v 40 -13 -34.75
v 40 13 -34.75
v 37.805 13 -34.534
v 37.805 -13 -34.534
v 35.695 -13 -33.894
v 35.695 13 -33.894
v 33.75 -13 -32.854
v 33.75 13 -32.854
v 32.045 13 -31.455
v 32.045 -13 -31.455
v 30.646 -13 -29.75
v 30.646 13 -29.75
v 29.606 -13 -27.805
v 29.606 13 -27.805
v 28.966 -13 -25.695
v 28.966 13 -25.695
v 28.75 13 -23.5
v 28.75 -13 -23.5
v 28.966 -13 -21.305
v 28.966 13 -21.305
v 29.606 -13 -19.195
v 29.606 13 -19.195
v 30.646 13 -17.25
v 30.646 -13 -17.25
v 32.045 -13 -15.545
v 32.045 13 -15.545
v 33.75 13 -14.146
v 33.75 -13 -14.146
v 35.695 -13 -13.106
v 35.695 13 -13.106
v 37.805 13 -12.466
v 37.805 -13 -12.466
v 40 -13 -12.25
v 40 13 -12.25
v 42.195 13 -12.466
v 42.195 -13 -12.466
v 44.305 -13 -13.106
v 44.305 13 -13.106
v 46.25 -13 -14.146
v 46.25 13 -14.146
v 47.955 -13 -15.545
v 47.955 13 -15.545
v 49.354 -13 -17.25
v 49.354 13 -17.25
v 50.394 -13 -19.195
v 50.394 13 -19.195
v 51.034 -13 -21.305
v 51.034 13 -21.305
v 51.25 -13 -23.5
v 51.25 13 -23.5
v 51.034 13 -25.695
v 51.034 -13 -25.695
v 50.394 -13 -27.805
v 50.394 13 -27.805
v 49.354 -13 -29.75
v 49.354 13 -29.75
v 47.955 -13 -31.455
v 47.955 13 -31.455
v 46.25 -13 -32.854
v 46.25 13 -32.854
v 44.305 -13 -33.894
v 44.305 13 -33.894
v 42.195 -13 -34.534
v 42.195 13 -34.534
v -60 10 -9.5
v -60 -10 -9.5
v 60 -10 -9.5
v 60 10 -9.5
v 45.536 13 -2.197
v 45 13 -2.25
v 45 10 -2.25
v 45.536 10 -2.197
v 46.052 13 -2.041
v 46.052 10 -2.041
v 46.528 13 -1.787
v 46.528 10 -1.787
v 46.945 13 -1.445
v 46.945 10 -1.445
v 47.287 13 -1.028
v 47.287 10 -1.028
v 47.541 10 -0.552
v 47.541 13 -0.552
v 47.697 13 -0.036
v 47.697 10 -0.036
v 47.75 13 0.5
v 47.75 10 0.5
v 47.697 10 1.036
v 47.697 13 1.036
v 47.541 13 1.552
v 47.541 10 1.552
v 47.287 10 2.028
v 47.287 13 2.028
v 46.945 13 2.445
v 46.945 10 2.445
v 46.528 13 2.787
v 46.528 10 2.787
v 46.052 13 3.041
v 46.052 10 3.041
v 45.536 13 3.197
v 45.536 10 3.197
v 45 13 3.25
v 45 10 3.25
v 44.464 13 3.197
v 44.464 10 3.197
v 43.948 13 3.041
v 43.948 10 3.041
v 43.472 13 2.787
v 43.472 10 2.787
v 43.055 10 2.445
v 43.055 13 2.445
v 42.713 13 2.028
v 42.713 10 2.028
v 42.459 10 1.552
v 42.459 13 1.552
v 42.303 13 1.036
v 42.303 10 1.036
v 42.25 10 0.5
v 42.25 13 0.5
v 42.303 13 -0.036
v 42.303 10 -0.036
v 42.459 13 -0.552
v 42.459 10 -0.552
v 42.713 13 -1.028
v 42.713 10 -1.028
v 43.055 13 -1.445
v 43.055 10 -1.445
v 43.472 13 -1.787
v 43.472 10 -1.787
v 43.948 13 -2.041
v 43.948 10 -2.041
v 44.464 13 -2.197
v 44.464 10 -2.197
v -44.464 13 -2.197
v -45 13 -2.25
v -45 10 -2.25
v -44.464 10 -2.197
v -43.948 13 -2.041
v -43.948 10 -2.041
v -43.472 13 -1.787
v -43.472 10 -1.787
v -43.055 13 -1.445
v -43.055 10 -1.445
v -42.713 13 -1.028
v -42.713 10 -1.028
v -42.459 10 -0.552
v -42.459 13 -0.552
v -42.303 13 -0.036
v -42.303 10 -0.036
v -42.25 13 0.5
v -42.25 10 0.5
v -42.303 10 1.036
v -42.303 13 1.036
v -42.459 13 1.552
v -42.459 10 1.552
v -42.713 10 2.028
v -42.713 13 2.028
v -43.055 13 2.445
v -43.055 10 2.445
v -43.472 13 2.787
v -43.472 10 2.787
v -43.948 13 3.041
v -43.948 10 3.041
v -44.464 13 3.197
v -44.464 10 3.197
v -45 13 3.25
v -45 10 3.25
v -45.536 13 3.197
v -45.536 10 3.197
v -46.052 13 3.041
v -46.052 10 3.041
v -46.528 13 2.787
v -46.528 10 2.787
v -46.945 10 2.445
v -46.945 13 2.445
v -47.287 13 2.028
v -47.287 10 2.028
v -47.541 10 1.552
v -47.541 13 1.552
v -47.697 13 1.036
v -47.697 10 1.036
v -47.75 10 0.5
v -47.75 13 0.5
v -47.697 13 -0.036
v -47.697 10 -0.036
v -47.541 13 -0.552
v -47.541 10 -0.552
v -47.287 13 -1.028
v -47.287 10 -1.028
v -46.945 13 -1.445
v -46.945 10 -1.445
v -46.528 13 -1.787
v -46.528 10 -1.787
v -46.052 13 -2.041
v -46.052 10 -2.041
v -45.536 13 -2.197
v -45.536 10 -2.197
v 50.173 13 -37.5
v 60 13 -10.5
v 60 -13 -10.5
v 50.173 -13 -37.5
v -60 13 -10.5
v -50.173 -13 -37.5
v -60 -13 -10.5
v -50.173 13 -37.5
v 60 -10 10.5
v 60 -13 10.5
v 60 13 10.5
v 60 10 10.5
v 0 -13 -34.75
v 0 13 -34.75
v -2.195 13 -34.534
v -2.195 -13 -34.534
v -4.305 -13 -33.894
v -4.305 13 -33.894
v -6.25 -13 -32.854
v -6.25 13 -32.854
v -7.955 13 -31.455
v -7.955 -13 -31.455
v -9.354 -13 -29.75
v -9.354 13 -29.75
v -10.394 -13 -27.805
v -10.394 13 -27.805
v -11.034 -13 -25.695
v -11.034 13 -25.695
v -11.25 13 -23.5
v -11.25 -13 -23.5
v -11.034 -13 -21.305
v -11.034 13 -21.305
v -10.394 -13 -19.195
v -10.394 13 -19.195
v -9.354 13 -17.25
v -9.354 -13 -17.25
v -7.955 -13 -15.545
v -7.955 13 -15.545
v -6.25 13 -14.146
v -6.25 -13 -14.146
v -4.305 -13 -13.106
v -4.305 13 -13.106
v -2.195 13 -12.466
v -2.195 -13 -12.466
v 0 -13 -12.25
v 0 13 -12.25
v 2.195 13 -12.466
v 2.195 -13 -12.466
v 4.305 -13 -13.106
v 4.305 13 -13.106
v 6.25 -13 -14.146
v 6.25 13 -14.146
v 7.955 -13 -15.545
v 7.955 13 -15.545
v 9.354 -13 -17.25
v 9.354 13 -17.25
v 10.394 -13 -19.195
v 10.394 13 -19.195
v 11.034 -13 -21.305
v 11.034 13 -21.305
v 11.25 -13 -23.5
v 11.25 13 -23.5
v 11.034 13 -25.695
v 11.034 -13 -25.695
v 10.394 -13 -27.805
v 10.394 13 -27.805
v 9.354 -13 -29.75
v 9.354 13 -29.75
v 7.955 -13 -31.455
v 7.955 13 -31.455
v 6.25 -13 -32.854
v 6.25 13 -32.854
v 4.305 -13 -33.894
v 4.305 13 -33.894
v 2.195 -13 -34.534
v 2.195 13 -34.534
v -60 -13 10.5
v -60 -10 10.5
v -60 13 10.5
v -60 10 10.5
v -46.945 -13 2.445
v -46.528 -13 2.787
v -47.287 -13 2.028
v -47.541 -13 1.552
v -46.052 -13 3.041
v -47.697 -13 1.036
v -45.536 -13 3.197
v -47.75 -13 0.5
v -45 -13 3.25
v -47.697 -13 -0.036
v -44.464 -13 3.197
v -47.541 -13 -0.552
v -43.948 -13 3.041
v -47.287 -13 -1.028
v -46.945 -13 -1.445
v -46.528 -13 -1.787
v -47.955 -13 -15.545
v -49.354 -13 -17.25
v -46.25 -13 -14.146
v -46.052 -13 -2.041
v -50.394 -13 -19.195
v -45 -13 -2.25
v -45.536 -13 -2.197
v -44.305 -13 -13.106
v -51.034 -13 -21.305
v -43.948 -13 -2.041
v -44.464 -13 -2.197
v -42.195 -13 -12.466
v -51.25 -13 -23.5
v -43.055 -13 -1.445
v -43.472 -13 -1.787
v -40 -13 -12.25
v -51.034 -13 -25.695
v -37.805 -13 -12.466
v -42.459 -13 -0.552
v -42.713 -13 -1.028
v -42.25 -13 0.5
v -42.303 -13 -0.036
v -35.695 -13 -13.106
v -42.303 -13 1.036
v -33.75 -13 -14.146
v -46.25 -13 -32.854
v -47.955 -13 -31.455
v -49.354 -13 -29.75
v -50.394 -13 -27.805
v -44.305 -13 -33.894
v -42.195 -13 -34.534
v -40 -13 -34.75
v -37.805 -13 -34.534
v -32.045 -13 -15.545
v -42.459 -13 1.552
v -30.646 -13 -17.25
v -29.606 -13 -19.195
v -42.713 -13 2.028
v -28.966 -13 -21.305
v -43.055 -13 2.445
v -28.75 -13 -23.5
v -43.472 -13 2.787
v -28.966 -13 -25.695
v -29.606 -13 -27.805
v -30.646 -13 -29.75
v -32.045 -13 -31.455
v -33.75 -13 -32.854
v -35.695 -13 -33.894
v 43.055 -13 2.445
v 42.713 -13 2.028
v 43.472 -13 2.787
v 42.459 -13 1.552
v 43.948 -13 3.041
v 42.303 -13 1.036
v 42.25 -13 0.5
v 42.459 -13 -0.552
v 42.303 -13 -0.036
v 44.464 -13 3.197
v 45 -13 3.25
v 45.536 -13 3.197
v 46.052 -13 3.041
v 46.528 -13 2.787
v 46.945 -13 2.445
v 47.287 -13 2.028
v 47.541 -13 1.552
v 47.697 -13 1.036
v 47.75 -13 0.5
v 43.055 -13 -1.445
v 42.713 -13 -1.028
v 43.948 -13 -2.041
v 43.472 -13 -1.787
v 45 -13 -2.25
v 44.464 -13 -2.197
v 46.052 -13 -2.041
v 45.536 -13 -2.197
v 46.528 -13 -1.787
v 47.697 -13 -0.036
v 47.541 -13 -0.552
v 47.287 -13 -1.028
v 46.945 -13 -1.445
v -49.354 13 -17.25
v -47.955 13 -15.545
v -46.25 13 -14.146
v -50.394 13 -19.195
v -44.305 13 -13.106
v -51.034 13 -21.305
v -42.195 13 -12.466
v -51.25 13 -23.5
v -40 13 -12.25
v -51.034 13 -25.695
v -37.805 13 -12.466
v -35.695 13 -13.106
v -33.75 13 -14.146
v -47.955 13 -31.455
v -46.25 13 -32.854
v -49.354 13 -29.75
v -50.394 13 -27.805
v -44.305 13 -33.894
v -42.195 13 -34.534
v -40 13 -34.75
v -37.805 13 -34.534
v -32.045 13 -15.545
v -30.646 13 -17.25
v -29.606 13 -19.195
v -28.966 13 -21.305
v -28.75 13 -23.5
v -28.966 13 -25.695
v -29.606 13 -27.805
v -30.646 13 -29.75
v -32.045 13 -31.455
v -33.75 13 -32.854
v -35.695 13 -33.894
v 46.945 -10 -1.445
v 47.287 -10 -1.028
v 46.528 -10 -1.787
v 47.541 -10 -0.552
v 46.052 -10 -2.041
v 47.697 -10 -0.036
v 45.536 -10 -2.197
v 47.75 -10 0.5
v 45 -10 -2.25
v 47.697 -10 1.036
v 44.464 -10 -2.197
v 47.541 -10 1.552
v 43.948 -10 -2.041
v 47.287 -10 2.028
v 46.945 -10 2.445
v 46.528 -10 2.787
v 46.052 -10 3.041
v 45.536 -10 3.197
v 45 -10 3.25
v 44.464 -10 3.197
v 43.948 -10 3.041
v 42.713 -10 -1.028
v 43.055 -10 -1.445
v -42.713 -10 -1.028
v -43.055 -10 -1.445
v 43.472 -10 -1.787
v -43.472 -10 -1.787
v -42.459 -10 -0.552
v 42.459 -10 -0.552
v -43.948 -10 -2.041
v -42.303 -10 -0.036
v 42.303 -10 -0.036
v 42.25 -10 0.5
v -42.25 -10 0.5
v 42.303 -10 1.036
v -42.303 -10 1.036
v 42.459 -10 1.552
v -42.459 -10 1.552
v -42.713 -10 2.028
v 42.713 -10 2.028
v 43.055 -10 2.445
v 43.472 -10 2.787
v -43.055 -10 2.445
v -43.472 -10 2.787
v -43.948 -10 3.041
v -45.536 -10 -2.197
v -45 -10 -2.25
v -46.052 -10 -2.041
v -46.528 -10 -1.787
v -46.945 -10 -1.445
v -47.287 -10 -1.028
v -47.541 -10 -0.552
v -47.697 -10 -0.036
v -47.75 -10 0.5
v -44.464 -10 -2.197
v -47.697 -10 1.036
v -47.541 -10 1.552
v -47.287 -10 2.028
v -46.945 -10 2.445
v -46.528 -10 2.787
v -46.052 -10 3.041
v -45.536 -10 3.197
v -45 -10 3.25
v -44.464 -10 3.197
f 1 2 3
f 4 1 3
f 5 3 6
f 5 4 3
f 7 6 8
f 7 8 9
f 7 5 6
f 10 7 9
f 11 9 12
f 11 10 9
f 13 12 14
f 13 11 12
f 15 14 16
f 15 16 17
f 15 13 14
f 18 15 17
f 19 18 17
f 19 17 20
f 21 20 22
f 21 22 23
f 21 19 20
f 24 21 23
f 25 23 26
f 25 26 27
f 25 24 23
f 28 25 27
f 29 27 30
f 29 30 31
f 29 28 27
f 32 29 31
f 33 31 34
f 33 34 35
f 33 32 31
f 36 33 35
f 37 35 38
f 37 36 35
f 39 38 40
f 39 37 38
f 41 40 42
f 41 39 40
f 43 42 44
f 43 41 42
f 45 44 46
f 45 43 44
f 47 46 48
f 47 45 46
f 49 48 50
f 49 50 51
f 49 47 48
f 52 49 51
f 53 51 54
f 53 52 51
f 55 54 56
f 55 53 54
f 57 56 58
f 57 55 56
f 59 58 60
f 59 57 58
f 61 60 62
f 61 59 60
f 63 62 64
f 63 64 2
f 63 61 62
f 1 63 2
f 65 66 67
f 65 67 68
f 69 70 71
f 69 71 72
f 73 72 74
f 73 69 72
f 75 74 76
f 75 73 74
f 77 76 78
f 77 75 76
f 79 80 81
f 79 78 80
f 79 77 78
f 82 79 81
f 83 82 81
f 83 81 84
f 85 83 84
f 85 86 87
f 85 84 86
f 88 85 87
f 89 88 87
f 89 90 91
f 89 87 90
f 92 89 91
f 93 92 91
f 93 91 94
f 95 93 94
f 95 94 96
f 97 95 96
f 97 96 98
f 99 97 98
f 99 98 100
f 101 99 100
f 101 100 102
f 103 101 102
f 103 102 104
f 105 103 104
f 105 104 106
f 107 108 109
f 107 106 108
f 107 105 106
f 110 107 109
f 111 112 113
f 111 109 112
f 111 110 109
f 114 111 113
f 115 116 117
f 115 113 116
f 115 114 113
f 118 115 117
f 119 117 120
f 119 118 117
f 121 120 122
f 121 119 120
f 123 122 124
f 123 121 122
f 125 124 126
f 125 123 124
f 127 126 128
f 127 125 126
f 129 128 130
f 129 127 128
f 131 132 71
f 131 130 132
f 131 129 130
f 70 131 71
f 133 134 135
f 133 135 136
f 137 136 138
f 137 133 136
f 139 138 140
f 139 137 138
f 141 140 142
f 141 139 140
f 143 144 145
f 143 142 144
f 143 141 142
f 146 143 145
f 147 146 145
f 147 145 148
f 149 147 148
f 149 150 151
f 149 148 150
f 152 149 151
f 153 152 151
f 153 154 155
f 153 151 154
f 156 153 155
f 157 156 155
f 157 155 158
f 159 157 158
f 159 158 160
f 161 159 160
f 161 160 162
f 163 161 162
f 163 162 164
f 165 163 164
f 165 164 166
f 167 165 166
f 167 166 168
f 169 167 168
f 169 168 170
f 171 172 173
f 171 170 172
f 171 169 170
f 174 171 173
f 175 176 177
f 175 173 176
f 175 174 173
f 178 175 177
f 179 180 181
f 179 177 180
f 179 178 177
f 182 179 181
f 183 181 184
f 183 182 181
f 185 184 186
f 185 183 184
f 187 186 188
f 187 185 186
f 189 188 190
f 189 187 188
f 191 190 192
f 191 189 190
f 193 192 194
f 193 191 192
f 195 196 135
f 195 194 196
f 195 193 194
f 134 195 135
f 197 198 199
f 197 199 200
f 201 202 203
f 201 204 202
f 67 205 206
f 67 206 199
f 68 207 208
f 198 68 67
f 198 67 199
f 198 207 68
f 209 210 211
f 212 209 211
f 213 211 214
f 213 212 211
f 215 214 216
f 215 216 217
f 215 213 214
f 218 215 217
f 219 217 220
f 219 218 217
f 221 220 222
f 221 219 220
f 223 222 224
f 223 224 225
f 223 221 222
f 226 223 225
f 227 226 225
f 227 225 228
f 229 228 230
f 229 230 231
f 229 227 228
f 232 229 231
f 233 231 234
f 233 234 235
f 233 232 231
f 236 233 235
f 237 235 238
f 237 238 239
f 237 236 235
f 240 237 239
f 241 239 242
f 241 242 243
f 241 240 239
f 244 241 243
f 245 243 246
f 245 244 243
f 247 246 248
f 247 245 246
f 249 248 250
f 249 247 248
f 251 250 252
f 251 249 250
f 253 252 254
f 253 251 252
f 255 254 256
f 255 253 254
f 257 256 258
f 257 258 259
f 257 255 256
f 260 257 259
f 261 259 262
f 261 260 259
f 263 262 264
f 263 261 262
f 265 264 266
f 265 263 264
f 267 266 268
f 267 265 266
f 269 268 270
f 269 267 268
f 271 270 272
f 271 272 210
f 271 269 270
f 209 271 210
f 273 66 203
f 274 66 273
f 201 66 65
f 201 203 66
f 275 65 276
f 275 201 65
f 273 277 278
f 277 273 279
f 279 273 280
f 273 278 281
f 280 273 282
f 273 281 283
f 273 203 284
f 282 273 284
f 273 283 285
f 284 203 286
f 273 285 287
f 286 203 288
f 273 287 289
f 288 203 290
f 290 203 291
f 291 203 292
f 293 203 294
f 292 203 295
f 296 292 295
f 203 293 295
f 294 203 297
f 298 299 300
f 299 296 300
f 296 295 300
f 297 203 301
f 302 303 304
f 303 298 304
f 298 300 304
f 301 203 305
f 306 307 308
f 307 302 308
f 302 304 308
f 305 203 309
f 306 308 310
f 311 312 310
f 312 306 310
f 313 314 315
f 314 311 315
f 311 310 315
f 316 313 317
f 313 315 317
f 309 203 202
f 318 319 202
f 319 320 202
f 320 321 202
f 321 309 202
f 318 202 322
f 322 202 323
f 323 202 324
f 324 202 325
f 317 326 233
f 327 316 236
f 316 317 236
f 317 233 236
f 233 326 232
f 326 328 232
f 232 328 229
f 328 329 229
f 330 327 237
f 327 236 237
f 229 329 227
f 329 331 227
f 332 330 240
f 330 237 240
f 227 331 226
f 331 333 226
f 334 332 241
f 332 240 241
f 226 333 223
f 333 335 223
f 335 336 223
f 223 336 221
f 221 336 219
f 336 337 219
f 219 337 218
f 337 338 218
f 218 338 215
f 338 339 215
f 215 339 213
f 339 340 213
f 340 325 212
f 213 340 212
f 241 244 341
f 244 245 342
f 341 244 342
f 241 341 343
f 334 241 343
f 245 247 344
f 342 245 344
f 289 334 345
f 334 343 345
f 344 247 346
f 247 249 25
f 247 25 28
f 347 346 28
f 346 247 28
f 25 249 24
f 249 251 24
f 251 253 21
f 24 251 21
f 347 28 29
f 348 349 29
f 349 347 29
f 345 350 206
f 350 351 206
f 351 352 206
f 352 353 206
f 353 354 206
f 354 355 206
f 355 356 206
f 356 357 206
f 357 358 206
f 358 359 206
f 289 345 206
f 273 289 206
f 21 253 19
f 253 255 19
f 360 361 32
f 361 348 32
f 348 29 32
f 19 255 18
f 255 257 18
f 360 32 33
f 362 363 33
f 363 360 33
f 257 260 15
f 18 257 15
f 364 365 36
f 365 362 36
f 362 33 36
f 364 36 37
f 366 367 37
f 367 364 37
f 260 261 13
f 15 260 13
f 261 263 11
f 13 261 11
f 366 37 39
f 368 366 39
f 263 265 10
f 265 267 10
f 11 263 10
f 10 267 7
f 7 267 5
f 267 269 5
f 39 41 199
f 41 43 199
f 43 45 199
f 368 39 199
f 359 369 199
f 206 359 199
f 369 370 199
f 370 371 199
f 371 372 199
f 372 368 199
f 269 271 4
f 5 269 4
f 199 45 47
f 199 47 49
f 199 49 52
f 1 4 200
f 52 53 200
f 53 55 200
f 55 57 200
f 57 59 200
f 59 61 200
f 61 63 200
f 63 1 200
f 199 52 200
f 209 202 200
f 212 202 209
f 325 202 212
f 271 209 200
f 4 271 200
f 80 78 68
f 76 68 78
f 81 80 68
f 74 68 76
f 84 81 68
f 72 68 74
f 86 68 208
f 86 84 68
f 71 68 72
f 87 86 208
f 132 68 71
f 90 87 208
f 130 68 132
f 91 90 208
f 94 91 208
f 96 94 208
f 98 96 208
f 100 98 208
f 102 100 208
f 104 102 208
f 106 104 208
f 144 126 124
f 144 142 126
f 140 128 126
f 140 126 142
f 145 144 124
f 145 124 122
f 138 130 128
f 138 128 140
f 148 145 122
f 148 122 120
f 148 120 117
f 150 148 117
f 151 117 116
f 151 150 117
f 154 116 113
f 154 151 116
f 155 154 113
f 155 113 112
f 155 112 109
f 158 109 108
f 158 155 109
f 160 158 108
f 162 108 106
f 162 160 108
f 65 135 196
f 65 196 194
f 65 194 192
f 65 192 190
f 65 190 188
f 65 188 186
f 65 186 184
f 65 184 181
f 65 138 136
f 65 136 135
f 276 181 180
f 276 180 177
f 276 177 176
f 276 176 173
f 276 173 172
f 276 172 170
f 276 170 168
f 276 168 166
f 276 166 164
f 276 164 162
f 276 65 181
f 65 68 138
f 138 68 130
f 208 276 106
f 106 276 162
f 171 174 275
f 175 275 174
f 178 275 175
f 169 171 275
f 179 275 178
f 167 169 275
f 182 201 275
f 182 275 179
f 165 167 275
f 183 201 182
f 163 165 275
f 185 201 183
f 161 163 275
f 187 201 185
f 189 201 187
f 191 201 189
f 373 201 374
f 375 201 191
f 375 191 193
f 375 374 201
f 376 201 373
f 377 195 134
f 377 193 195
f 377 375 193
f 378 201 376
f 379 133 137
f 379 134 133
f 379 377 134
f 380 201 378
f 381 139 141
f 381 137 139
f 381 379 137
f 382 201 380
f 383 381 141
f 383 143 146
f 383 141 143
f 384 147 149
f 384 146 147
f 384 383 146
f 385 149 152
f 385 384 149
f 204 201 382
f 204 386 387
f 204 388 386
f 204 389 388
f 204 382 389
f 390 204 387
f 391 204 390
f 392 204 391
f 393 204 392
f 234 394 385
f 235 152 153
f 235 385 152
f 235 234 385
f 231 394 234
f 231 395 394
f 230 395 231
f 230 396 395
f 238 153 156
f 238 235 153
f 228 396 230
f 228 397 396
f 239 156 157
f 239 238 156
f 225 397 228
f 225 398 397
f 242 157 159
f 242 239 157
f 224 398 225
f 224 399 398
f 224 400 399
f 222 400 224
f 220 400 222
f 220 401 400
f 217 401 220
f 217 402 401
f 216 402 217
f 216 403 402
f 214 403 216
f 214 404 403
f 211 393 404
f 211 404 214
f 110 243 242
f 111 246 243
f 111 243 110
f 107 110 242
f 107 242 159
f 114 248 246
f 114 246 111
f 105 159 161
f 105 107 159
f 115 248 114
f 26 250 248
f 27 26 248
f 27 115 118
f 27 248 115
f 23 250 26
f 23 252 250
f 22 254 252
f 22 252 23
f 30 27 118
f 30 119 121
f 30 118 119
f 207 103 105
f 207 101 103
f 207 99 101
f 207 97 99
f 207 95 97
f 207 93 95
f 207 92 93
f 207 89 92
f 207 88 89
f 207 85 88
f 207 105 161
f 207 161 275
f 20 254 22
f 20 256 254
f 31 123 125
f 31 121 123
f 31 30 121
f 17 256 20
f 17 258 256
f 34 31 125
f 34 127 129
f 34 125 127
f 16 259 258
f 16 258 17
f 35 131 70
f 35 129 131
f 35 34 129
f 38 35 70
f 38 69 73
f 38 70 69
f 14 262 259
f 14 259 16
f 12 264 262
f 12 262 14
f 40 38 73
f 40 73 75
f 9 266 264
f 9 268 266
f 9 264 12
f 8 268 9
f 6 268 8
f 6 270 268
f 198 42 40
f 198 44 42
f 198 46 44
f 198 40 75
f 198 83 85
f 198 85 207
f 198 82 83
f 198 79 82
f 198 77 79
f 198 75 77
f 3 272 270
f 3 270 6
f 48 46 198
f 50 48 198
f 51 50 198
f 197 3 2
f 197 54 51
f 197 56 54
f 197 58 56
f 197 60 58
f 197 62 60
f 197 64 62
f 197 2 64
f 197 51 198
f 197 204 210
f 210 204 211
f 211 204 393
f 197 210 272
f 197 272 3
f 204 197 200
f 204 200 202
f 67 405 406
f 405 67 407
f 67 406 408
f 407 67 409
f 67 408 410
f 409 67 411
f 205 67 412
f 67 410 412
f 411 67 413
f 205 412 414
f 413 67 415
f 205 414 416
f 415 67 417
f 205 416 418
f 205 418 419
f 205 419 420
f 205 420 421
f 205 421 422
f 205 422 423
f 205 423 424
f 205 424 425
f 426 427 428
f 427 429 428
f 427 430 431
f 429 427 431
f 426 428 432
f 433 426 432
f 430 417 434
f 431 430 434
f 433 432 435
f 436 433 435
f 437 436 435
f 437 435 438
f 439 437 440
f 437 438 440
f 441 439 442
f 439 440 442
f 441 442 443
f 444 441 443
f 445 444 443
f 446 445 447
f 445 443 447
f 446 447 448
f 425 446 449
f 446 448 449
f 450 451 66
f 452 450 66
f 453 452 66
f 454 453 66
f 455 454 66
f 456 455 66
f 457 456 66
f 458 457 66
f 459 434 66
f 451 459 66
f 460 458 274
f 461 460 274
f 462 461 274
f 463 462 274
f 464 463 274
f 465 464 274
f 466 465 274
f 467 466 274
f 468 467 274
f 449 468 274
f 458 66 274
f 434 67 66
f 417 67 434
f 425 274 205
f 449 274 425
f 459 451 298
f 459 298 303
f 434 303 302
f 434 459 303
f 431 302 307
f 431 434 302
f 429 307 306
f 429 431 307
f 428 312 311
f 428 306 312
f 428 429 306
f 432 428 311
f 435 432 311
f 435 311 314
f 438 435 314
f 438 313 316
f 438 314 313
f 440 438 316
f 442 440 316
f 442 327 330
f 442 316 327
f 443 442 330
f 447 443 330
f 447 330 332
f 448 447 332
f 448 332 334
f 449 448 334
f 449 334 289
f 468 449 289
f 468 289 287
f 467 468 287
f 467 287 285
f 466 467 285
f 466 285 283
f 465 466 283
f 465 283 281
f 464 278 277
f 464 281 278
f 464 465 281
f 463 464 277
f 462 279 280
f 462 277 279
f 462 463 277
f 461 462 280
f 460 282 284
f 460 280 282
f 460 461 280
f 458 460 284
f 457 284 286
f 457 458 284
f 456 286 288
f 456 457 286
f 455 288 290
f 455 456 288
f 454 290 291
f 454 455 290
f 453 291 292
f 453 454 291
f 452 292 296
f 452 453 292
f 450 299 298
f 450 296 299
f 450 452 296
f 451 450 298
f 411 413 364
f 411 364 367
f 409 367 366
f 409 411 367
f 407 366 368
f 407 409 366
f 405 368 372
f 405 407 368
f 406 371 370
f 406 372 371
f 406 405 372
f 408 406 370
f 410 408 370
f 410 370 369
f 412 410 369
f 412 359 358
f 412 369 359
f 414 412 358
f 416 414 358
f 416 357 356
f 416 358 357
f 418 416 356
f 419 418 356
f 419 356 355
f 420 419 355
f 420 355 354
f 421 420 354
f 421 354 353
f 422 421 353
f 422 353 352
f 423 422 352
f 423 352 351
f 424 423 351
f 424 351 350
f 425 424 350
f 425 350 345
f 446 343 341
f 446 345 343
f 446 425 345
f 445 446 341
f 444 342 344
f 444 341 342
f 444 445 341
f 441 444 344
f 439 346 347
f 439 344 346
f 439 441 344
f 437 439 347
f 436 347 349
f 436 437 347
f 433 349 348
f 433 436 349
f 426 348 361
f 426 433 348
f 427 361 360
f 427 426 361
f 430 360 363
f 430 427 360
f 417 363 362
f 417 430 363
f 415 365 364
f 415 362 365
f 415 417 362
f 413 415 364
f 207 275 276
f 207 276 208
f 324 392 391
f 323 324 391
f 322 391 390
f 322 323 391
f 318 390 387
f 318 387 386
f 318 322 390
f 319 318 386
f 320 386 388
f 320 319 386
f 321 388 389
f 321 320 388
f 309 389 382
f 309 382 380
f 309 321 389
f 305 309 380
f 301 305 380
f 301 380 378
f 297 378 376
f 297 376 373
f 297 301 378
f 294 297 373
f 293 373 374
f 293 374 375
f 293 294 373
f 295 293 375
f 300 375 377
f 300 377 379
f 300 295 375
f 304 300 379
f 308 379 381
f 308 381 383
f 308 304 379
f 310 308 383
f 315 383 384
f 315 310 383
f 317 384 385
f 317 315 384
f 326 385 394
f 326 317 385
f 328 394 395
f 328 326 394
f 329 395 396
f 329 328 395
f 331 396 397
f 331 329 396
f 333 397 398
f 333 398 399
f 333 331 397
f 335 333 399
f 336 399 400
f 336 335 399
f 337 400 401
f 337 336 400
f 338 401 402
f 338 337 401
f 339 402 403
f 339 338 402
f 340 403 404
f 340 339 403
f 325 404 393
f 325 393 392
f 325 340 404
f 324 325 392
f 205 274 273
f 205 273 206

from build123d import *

# Parameters (mm, degrees)
SKETCH_1_R              = 11.25
EXTRUDE_1_DEPTH         = 13
SKETCH_2_W              = 20
SKETCH_2_H              = 20
CUT_EXTRUDE_1_DEPTH     = 127.393235578
CUT_EXTRUDE1_DEPTH      = 75.399260749
CUT_EXTRUDE1_DEPTH_BACK = 75.399260749
SKETCH1_R               = 2.75


with BuildPart() as part:
    # Эскиз1 → Бобышка-Вытянуть1 (new, symmetric)
    with BuildSketch(Plane(origin=(0, 0, 0), x_dir=(1, 0, 0), z_dir=(0, 1, 0))):
        Polygon((-60, -10.5), (60, -10.5), (60, 10.5), (50.172803675, 37.5), (0, 37.5), (-50.172803675, 37.5), (-60, 10.5), align=None)
        with Locations(Location((0, 23.5, 0), (0, 0, 90))):
            Circle(SKETCH_1_R, mode=Mode.SUBTRACT)
        with Locations(Location((-40, 23.5, 0), (0, 0, 90))):
            Circle(SKETCH_1_R, mode=Mode.SUBTRACT)
        with Locations(Location((40, 23.5, 0), (0, 0, 90))):
            Circle(SKETCH_1_R, mode=Mode.SUBTRACT)
    extrude(amount=EXTRUDE_1_DEPTH, both=True)

    # Эскиз2 → Вырез-Вытянуть1 (cut, through all)
    with BuildSketch(Plane.ZY.offset(60)):
        with Locations((0.5, 0)):
            Rectangle(SKETCH_2_W, SKETCH_2_H)
    extrude(amount=-CUT_EXTRUDE_1_DEPTH, mode=Mode.SUBTRACT)

    # Sketch1 → Cut-Extrude1 (cut, two sides: drawn at the far end of the back side and taken through both)
    with BuildSketch(Plane.XZ.offset(-10).offset(-CUT_EXTRUDE1_DEPTH_BACK)):
        with Locations(Location((45, 0.5, 0), (0, 0, 270))):
            Circle(SKETCH1_R)
        with Locations(Location((-45, 0.5, 0), (0, 0, 270))):
            Circle(SKETCH1_R)
    extrude(amount=CUT_EXTRUDE1_DEPTH + CUT_EXTRUDE1_DEPTH_BACK, mode=Mode.SUBTRACT)


solid = part.part
